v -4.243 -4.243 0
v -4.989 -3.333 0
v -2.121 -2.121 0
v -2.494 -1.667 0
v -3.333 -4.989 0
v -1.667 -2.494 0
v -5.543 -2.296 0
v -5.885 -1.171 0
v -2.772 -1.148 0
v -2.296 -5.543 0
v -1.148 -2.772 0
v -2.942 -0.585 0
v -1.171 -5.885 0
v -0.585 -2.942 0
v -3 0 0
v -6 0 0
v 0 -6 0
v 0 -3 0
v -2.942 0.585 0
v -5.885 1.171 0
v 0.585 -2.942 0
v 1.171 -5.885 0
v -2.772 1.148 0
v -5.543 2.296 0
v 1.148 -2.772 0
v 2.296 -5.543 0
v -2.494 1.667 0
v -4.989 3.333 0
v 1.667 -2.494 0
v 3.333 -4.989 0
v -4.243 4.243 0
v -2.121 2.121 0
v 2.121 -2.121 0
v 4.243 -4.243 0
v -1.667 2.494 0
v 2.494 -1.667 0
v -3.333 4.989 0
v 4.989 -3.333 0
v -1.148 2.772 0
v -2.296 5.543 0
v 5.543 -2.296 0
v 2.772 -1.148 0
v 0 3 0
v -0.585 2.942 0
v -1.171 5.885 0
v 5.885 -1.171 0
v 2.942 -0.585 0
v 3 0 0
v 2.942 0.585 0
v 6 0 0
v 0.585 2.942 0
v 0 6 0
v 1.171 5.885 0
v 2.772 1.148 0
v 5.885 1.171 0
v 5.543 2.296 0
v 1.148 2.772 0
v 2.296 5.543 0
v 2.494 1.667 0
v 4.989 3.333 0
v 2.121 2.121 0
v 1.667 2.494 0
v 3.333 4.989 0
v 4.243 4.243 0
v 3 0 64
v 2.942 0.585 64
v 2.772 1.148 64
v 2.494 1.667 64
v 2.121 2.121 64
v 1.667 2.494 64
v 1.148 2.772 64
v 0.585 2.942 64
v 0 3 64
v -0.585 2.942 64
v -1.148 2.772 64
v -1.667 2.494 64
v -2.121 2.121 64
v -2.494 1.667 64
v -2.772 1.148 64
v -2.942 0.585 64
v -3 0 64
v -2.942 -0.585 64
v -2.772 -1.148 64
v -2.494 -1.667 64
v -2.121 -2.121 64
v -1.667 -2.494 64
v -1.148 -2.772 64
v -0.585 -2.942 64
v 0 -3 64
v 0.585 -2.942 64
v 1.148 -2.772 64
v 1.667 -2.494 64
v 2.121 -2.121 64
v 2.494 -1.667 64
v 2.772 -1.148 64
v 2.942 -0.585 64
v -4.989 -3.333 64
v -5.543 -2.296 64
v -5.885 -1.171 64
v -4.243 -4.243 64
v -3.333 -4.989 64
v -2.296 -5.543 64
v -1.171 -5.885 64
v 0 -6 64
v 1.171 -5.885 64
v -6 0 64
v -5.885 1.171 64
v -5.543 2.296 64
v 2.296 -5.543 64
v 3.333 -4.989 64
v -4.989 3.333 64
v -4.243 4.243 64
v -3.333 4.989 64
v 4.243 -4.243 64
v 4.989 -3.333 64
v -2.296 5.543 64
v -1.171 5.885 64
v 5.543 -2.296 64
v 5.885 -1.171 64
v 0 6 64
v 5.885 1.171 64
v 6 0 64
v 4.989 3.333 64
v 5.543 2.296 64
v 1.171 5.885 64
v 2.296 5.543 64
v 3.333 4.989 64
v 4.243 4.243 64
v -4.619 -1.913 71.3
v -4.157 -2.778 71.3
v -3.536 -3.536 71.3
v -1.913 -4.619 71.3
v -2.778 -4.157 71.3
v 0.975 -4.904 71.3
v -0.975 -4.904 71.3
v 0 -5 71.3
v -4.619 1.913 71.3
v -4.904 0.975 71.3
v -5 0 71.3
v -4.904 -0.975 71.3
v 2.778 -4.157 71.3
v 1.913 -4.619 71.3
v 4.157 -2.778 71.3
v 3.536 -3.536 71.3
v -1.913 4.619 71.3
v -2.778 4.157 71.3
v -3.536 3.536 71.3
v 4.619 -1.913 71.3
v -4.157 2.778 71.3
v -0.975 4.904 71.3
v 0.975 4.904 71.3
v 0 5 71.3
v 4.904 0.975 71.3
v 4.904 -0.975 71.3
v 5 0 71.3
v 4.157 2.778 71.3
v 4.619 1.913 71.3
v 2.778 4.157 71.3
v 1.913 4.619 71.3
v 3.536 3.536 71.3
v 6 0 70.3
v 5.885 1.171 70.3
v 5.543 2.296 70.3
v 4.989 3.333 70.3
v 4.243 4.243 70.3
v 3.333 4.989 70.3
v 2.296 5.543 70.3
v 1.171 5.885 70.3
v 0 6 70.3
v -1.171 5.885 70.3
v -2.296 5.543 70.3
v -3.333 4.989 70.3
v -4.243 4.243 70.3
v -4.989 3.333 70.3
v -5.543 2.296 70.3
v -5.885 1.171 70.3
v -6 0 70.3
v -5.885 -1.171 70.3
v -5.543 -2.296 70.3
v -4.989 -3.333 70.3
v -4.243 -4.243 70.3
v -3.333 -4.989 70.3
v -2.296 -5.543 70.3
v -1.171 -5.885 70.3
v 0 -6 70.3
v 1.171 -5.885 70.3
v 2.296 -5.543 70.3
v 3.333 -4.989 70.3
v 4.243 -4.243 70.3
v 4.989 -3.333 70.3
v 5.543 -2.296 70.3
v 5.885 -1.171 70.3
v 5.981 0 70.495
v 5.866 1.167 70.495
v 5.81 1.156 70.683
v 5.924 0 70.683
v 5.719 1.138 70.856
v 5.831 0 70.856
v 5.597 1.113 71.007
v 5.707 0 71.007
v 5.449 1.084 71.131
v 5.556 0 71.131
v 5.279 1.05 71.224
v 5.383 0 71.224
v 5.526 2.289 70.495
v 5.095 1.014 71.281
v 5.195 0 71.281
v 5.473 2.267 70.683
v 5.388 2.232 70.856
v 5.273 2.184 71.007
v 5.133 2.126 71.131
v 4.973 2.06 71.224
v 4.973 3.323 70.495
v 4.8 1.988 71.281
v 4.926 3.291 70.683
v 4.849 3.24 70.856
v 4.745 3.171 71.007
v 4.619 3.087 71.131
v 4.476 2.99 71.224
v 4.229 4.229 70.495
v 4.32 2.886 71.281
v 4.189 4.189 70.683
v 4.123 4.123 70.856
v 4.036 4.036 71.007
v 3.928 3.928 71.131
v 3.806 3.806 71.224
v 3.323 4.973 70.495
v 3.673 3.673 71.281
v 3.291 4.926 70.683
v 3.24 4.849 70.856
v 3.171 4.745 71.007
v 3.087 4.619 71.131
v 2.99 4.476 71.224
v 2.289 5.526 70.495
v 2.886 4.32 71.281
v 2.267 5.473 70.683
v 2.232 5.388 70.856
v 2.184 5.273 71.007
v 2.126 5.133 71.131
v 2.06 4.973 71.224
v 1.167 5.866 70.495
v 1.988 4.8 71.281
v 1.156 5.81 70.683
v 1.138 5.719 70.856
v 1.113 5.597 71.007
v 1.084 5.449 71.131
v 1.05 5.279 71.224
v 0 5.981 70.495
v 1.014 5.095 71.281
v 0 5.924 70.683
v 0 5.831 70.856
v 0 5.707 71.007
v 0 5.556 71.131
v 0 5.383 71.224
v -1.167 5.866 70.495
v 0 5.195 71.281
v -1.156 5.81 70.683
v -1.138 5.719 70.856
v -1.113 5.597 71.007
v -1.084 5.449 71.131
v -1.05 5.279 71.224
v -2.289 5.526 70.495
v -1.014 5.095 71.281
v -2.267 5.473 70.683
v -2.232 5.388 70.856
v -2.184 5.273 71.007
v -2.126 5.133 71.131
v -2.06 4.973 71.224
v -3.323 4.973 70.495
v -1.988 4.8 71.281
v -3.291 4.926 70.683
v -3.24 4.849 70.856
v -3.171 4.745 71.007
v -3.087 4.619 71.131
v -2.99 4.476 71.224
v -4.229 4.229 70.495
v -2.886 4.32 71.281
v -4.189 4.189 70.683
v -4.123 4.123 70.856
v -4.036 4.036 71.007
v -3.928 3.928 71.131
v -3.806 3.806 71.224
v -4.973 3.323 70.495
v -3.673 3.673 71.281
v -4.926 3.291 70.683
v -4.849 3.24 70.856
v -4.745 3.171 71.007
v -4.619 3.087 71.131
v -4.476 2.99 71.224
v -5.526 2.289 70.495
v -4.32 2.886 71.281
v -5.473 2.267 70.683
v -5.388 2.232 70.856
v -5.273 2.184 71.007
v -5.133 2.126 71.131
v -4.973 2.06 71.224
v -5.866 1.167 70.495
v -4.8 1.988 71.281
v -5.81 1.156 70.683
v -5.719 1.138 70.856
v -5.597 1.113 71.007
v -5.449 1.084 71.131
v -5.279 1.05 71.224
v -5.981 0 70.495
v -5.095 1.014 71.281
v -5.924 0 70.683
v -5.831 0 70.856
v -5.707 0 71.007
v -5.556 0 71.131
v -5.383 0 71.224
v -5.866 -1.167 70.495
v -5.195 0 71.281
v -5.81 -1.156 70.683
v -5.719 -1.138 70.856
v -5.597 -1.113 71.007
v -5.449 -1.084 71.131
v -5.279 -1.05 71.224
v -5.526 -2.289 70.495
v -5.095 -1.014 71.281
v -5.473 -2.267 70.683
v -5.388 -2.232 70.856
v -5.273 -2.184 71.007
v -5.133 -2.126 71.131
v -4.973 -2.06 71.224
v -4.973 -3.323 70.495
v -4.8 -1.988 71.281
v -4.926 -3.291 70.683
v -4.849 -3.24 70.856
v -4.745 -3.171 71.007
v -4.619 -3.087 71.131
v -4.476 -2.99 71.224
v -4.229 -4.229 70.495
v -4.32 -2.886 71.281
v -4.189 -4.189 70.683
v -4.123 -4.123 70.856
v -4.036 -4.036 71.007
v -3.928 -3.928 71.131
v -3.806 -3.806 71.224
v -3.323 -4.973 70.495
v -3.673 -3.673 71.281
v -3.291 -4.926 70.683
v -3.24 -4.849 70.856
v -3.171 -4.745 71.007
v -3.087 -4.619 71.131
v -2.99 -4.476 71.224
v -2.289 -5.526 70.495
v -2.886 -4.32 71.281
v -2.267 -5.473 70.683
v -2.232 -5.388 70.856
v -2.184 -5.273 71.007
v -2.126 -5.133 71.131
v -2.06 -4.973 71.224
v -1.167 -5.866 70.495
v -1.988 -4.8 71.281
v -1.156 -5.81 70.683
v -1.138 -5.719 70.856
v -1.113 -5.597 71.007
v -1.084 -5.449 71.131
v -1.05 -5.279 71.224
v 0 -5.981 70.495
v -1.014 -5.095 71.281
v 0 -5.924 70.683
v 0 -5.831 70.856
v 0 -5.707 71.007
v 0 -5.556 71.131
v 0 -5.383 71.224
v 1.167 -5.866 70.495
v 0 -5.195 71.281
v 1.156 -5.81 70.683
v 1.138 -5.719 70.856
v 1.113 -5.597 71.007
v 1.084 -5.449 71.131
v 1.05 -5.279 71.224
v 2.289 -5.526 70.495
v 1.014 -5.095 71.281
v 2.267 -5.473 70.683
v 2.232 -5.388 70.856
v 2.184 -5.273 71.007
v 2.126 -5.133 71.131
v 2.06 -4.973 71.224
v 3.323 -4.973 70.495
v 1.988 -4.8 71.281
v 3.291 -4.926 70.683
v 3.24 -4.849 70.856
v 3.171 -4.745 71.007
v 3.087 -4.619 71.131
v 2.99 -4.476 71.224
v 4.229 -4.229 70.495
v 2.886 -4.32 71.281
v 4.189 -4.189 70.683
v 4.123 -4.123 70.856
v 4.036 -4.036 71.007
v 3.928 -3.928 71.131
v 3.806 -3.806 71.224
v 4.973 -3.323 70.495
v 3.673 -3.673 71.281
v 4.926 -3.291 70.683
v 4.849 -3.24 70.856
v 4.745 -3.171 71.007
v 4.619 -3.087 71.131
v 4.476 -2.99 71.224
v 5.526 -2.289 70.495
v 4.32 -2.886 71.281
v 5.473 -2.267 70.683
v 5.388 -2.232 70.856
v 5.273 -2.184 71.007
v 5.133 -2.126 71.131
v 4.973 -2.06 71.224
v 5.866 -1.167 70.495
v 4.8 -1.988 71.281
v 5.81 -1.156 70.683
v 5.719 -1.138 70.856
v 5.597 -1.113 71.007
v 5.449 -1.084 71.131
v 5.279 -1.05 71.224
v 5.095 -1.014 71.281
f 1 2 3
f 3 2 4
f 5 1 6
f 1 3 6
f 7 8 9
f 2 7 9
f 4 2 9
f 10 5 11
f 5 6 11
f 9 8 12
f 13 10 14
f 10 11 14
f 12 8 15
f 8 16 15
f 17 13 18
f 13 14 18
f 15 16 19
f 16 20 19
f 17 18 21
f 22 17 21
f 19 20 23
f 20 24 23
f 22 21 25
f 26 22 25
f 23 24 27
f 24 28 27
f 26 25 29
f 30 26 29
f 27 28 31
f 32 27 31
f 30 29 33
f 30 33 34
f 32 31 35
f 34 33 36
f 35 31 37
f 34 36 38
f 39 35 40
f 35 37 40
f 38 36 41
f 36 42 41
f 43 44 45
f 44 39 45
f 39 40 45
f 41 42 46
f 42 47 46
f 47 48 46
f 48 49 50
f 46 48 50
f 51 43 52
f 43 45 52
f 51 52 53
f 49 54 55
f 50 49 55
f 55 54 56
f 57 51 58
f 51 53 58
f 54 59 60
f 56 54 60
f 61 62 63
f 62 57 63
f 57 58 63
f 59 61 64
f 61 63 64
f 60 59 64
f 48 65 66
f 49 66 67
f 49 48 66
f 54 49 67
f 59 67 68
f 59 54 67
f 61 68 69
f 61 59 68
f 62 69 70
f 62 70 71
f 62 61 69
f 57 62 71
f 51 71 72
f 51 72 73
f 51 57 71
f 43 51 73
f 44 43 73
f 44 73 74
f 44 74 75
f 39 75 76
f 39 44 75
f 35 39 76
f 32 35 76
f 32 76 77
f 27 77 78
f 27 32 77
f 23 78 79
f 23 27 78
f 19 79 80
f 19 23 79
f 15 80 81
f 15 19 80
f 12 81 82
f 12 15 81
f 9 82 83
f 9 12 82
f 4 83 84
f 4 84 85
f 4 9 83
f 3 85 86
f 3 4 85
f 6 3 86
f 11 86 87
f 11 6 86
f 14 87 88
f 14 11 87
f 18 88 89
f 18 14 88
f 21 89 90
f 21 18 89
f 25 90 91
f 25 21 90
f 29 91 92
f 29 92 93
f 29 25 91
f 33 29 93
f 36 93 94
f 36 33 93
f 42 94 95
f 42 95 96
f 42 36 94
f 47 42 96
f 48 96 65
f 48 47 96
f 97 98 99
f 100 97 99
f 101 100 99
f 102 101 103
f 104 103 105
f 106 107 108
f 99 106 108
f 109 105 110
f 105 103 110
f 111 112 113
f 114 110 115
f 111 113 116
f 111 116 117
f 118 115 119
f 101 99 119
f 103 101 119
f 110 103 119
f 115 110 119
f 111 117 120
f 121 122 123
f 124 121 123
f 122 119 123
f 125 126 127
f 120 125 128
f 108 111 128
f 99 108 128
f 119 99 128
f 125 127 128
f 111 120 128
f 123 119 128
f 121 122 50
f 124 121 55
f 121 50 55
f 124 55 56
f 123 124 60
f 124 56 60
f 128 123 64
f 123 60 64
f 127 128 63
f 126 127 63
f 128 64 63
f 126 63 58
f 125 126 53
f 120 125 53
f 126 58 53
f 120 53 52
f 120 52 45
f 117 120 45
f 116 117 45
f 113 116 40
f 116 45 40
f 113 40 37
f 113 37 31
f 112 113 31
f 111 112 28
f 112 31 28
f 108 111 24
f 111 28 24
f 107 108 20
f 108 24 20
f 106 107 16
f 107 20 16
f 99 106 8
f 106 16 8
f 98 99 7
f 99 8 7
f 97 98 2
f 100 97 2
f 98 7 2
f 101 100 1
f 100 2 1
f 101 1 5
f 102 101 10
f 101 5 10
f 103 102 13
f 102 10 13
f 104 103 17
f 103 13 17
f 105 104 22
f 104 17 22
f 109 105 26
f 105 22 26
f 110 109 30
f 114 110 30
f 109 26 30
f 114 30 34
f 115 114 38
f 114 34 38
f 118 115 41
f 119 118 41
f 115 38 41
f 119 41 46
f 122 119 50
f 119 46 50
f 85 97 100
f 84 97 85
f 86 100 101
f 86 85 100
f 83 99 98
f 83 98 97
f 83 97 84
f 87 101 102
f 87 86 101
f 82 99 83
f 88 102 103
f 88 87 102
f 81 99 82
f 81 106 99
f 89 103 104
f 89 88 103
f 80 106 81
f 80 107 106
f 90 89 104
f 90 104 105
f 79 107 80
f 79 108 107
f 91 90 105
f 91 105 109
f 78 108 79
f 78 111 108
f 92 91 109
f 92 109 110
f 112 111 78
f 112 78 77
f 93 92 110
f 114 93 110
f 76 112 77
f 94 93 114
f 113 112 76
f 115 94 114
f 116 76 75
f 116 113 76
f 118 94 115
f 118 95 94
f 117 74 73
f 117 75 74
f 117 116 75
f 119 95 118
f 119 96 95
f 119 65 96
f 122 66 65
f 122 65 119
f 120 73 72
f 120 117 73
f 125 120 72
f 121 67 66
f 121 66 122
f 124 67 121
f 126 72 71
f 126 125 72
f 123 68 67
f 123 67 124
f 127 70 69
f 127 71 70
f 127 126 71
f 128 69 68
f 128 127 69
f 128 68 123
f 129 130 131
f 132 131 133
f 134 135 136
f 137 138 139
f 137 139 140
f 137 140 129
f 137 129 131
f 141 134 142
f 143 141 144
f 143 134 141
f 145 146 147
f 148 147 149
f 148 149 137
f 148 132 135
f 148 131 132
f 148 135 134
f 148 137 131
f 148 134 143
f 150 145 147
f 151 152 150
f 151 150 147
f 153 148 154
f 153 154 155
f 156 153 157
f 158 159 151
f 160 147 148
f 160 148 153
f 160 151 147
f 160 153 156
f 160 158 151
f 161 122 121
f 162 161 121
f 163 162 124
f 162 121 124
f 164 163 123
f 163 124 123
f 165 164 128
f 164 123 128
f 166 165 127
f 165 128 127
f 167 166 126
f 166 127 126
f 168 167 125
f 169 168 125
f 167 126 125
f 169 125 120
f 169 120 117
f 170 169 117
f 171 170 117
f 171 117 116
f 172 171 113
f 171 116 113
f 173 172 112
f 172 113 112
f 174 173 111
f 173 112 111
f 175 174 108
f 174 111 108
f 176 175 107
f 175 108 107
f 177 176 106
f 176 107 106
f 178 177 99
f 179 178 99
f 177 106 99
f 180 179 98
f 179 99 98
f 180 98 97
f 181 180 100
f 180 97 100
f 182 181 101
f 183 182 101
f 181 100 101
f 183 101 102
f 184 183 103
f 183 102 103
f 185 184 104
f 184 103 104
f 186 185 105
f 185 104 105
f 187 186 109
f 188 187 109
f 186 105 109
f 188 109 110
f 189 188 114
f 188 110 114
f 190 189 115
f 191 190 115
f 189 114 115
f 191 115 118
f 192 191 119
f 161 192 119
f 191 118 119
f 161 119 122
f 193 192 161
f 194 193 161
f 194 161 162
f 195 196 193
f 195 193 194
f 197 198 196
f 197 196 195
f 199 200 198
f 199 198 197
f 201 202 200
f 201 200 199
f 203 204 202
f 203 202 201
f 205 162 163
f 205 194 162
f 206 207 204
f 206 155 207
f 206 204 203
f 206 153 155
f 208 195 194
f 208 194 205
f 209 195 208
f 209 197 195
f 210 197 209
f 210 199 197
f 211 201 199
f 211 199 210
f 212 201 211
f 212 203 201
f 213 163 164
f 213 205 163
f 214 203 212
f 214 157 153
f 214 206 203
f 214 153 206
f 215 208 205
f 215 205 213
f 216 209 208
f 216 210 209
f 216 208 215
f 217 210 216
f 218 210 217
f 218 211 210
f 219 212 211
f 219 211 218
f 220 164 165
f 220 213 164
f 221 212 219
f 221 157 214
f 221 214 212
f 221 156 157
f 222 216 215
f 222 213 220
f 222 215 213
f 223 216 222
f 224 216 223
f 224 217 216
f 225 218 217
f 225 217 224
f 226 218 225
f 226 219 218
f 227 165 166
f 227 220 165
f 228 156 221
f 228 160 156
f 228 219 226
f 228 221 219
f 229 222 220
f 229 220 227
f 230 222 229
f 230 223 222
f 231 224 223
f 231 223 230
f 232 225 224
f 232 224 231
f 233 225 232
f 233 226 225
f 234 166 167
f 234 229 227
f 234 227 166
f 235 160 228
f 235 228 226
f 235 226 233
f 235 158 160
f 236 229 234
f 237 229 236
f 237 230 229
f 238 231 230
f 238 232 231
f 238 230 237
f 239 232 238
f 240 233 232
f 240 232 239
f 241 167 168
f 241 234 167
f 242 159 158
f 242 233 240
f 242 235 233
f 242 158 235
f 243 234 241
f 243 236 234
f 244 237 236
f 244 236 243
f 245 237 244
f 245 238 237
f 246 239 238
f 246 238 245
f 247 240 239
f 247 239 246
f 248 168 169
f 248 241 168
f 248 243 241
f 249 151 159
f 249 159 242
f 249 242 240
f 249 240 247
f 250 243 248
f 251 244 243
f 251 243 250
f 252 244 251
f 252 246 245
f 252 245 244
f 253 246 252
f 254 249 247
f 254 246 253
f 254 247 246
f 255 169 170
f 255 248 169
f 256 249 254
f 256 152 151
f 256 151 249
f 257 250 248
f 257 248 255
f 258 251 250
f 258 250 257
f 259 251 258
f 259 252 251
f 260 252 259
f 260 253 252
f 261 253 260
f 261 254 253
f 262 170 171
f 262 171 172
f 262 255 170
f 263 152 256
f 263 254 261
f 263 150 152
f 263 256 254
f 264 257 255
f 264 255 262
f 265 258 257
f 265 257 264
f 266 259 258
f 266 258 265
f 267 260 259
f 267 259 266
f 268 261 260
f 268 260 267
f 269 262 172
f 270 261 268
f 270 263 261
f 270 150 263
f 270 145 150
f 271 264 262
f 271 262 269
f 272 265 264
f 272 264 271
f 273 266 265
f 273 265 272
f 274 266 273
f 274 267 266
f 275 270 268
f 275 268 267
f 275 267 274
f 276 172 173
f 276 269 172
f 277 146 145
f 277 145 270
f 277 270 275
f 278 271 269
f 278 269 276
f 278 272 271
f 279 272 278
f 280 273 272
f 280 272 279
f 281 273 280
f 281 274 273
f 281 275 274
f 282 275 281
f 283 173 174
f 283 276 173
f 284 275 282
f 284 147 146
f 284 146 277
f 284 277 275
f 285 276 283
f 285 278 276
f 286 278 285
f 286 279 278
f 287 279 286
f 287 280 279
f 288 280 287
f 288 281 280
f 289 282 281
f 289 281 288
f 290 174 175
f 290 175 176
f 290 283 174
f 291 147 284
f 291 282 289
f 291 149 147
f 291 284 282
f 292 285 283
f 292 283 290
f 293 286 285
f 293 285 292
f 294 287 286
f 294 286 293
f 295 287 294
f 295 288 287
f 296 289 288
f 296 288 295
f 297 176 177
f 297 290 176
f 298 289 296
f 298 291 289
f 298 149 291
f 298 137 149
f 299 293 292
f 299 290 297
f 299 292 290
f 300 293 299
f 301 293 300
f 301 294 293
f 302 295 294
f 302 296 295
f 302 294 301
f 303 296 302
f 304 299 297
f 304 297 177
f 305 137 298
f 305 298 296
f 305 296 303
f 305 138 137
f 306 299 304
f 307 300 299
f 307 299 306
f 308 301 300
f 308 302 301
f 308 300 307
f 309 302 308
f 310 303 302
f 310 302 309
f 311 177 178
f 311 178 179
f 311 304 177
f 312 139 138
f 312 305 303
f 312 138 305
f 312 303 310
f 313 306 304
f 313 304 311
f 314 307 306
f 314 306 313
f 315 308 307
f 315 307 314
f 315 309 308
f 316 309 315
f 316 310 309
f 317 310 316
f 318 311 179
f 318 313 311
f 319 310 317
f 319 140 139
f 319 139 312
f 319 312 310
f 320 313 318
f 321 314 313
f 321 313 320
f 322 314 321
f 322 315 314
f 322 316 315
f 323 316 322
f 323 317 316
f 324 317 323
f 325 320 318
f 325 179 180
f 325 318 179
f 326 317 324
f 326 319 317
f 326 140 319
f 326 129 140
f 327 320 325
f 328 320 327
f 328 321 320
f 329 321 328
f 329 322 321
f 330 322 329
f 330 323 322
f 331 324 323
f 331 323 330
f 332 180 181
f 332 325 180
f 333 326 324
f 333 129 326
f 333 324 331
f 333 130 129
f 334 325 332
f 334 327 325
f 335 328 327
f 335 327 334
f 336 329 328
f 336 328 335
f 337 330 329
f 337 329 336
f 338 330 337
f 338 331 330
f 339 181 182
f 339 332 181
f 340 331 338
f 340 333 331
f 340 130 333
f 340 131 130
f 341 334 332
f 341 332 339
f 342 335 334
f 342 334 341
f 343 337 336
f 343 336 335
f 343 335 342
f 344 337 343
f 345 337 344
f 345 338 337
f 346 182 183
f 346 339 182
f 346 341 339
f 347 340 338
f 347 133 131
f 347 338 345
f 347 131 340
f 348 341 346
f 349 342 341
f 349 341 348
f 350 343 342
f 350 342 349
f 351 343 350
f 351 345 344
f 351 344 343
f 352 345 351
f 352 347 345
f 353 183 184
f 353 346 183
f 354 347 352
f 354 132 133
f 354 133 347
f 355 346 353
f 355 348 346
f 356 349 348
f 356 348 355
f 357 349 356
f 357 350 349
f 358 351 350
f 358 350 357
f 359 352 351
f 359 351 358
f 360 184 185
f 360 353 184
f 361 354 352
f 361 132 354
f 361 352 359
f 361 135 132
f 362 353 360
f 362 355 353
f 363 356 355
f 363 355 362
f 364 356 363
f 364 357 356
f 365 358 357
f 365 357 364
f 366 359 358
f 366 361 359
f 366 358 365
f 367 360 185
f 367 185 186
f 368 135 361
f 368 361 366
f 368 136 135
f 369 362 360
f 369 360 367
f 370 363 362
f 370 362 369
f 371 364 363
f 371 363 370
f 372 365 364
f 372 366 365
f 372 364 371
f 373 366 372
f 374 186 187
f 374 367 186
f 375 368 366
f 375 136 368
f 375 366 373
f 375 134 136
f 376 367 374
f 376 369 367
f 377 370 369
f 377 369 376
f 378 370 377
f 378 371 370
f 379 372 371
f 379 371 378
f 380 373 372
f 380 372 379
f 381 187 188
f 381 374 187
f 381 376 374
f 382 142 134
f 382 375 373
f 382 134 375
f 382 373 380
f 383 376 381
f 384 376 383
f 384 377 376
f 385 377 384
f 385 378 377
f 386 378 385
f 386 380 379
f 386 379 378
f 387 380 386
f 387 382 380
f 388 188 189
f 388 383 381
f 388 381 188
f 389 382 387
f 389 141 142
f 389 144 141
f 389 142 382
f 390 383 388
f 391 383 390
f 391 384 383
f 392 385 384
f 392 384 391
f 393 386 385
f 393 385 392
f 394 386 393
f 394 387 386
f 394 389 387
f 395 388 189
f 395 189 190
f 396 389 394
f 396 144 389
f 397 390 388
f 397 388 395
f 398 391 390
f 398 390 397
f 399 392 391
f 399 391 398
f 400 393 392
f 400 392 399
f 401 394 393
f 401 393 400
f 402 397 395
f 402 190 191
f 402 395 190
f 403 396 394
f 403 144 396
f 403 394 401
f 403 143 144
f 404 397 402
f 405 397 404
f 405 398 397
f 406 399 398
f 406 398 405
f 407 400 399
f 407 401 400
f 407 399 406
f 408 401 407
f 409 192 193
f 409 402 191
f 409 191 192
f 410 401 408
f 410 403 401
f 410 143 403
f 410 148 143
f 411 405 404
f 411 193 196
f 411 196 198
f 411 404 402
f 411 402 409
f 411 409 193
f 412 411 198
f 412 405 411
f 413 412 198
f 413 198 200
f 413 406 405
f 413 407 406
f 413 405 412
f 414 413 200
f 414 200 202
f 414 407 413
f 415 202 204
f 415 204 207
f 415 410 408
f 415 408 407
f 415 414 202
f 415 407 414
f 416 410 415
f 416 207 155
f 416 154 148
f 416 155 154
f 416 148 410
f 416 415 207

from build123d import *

# Parameters (mm, degrees)
F0_R     = 6
F0_R_2   = 3
F1_DEPTH = 64
F2_R     = 6
F3_DEPTH = 7.3
F4_R     = 1


with BuildPart() as f1:
    # F0 (on Top) → F1 (new body)
    with BuildSketch(Plane.XY):
        Circle(F0_R)
        Circle(F0_R_2, mode=Mode.SUBTRACT)
    extrude(amount=F1_DEPTH)


with BuildPart() as f3:
    # F2 (on face) → F3 (new body)
    with BuildSketch(Plane.XY.offset(64)):
        Circle(F2_R)
    extrude(amount=F3_DEPTH)

    # F4
    f4_edges = [f3.edges().sort_by_distance(p)[0] for p in [
        (-6, 0, 71.3),
    ]]
    fillet(f4_edges, radius=F4_R)


solid = Compound([f1.part, f3.part])
